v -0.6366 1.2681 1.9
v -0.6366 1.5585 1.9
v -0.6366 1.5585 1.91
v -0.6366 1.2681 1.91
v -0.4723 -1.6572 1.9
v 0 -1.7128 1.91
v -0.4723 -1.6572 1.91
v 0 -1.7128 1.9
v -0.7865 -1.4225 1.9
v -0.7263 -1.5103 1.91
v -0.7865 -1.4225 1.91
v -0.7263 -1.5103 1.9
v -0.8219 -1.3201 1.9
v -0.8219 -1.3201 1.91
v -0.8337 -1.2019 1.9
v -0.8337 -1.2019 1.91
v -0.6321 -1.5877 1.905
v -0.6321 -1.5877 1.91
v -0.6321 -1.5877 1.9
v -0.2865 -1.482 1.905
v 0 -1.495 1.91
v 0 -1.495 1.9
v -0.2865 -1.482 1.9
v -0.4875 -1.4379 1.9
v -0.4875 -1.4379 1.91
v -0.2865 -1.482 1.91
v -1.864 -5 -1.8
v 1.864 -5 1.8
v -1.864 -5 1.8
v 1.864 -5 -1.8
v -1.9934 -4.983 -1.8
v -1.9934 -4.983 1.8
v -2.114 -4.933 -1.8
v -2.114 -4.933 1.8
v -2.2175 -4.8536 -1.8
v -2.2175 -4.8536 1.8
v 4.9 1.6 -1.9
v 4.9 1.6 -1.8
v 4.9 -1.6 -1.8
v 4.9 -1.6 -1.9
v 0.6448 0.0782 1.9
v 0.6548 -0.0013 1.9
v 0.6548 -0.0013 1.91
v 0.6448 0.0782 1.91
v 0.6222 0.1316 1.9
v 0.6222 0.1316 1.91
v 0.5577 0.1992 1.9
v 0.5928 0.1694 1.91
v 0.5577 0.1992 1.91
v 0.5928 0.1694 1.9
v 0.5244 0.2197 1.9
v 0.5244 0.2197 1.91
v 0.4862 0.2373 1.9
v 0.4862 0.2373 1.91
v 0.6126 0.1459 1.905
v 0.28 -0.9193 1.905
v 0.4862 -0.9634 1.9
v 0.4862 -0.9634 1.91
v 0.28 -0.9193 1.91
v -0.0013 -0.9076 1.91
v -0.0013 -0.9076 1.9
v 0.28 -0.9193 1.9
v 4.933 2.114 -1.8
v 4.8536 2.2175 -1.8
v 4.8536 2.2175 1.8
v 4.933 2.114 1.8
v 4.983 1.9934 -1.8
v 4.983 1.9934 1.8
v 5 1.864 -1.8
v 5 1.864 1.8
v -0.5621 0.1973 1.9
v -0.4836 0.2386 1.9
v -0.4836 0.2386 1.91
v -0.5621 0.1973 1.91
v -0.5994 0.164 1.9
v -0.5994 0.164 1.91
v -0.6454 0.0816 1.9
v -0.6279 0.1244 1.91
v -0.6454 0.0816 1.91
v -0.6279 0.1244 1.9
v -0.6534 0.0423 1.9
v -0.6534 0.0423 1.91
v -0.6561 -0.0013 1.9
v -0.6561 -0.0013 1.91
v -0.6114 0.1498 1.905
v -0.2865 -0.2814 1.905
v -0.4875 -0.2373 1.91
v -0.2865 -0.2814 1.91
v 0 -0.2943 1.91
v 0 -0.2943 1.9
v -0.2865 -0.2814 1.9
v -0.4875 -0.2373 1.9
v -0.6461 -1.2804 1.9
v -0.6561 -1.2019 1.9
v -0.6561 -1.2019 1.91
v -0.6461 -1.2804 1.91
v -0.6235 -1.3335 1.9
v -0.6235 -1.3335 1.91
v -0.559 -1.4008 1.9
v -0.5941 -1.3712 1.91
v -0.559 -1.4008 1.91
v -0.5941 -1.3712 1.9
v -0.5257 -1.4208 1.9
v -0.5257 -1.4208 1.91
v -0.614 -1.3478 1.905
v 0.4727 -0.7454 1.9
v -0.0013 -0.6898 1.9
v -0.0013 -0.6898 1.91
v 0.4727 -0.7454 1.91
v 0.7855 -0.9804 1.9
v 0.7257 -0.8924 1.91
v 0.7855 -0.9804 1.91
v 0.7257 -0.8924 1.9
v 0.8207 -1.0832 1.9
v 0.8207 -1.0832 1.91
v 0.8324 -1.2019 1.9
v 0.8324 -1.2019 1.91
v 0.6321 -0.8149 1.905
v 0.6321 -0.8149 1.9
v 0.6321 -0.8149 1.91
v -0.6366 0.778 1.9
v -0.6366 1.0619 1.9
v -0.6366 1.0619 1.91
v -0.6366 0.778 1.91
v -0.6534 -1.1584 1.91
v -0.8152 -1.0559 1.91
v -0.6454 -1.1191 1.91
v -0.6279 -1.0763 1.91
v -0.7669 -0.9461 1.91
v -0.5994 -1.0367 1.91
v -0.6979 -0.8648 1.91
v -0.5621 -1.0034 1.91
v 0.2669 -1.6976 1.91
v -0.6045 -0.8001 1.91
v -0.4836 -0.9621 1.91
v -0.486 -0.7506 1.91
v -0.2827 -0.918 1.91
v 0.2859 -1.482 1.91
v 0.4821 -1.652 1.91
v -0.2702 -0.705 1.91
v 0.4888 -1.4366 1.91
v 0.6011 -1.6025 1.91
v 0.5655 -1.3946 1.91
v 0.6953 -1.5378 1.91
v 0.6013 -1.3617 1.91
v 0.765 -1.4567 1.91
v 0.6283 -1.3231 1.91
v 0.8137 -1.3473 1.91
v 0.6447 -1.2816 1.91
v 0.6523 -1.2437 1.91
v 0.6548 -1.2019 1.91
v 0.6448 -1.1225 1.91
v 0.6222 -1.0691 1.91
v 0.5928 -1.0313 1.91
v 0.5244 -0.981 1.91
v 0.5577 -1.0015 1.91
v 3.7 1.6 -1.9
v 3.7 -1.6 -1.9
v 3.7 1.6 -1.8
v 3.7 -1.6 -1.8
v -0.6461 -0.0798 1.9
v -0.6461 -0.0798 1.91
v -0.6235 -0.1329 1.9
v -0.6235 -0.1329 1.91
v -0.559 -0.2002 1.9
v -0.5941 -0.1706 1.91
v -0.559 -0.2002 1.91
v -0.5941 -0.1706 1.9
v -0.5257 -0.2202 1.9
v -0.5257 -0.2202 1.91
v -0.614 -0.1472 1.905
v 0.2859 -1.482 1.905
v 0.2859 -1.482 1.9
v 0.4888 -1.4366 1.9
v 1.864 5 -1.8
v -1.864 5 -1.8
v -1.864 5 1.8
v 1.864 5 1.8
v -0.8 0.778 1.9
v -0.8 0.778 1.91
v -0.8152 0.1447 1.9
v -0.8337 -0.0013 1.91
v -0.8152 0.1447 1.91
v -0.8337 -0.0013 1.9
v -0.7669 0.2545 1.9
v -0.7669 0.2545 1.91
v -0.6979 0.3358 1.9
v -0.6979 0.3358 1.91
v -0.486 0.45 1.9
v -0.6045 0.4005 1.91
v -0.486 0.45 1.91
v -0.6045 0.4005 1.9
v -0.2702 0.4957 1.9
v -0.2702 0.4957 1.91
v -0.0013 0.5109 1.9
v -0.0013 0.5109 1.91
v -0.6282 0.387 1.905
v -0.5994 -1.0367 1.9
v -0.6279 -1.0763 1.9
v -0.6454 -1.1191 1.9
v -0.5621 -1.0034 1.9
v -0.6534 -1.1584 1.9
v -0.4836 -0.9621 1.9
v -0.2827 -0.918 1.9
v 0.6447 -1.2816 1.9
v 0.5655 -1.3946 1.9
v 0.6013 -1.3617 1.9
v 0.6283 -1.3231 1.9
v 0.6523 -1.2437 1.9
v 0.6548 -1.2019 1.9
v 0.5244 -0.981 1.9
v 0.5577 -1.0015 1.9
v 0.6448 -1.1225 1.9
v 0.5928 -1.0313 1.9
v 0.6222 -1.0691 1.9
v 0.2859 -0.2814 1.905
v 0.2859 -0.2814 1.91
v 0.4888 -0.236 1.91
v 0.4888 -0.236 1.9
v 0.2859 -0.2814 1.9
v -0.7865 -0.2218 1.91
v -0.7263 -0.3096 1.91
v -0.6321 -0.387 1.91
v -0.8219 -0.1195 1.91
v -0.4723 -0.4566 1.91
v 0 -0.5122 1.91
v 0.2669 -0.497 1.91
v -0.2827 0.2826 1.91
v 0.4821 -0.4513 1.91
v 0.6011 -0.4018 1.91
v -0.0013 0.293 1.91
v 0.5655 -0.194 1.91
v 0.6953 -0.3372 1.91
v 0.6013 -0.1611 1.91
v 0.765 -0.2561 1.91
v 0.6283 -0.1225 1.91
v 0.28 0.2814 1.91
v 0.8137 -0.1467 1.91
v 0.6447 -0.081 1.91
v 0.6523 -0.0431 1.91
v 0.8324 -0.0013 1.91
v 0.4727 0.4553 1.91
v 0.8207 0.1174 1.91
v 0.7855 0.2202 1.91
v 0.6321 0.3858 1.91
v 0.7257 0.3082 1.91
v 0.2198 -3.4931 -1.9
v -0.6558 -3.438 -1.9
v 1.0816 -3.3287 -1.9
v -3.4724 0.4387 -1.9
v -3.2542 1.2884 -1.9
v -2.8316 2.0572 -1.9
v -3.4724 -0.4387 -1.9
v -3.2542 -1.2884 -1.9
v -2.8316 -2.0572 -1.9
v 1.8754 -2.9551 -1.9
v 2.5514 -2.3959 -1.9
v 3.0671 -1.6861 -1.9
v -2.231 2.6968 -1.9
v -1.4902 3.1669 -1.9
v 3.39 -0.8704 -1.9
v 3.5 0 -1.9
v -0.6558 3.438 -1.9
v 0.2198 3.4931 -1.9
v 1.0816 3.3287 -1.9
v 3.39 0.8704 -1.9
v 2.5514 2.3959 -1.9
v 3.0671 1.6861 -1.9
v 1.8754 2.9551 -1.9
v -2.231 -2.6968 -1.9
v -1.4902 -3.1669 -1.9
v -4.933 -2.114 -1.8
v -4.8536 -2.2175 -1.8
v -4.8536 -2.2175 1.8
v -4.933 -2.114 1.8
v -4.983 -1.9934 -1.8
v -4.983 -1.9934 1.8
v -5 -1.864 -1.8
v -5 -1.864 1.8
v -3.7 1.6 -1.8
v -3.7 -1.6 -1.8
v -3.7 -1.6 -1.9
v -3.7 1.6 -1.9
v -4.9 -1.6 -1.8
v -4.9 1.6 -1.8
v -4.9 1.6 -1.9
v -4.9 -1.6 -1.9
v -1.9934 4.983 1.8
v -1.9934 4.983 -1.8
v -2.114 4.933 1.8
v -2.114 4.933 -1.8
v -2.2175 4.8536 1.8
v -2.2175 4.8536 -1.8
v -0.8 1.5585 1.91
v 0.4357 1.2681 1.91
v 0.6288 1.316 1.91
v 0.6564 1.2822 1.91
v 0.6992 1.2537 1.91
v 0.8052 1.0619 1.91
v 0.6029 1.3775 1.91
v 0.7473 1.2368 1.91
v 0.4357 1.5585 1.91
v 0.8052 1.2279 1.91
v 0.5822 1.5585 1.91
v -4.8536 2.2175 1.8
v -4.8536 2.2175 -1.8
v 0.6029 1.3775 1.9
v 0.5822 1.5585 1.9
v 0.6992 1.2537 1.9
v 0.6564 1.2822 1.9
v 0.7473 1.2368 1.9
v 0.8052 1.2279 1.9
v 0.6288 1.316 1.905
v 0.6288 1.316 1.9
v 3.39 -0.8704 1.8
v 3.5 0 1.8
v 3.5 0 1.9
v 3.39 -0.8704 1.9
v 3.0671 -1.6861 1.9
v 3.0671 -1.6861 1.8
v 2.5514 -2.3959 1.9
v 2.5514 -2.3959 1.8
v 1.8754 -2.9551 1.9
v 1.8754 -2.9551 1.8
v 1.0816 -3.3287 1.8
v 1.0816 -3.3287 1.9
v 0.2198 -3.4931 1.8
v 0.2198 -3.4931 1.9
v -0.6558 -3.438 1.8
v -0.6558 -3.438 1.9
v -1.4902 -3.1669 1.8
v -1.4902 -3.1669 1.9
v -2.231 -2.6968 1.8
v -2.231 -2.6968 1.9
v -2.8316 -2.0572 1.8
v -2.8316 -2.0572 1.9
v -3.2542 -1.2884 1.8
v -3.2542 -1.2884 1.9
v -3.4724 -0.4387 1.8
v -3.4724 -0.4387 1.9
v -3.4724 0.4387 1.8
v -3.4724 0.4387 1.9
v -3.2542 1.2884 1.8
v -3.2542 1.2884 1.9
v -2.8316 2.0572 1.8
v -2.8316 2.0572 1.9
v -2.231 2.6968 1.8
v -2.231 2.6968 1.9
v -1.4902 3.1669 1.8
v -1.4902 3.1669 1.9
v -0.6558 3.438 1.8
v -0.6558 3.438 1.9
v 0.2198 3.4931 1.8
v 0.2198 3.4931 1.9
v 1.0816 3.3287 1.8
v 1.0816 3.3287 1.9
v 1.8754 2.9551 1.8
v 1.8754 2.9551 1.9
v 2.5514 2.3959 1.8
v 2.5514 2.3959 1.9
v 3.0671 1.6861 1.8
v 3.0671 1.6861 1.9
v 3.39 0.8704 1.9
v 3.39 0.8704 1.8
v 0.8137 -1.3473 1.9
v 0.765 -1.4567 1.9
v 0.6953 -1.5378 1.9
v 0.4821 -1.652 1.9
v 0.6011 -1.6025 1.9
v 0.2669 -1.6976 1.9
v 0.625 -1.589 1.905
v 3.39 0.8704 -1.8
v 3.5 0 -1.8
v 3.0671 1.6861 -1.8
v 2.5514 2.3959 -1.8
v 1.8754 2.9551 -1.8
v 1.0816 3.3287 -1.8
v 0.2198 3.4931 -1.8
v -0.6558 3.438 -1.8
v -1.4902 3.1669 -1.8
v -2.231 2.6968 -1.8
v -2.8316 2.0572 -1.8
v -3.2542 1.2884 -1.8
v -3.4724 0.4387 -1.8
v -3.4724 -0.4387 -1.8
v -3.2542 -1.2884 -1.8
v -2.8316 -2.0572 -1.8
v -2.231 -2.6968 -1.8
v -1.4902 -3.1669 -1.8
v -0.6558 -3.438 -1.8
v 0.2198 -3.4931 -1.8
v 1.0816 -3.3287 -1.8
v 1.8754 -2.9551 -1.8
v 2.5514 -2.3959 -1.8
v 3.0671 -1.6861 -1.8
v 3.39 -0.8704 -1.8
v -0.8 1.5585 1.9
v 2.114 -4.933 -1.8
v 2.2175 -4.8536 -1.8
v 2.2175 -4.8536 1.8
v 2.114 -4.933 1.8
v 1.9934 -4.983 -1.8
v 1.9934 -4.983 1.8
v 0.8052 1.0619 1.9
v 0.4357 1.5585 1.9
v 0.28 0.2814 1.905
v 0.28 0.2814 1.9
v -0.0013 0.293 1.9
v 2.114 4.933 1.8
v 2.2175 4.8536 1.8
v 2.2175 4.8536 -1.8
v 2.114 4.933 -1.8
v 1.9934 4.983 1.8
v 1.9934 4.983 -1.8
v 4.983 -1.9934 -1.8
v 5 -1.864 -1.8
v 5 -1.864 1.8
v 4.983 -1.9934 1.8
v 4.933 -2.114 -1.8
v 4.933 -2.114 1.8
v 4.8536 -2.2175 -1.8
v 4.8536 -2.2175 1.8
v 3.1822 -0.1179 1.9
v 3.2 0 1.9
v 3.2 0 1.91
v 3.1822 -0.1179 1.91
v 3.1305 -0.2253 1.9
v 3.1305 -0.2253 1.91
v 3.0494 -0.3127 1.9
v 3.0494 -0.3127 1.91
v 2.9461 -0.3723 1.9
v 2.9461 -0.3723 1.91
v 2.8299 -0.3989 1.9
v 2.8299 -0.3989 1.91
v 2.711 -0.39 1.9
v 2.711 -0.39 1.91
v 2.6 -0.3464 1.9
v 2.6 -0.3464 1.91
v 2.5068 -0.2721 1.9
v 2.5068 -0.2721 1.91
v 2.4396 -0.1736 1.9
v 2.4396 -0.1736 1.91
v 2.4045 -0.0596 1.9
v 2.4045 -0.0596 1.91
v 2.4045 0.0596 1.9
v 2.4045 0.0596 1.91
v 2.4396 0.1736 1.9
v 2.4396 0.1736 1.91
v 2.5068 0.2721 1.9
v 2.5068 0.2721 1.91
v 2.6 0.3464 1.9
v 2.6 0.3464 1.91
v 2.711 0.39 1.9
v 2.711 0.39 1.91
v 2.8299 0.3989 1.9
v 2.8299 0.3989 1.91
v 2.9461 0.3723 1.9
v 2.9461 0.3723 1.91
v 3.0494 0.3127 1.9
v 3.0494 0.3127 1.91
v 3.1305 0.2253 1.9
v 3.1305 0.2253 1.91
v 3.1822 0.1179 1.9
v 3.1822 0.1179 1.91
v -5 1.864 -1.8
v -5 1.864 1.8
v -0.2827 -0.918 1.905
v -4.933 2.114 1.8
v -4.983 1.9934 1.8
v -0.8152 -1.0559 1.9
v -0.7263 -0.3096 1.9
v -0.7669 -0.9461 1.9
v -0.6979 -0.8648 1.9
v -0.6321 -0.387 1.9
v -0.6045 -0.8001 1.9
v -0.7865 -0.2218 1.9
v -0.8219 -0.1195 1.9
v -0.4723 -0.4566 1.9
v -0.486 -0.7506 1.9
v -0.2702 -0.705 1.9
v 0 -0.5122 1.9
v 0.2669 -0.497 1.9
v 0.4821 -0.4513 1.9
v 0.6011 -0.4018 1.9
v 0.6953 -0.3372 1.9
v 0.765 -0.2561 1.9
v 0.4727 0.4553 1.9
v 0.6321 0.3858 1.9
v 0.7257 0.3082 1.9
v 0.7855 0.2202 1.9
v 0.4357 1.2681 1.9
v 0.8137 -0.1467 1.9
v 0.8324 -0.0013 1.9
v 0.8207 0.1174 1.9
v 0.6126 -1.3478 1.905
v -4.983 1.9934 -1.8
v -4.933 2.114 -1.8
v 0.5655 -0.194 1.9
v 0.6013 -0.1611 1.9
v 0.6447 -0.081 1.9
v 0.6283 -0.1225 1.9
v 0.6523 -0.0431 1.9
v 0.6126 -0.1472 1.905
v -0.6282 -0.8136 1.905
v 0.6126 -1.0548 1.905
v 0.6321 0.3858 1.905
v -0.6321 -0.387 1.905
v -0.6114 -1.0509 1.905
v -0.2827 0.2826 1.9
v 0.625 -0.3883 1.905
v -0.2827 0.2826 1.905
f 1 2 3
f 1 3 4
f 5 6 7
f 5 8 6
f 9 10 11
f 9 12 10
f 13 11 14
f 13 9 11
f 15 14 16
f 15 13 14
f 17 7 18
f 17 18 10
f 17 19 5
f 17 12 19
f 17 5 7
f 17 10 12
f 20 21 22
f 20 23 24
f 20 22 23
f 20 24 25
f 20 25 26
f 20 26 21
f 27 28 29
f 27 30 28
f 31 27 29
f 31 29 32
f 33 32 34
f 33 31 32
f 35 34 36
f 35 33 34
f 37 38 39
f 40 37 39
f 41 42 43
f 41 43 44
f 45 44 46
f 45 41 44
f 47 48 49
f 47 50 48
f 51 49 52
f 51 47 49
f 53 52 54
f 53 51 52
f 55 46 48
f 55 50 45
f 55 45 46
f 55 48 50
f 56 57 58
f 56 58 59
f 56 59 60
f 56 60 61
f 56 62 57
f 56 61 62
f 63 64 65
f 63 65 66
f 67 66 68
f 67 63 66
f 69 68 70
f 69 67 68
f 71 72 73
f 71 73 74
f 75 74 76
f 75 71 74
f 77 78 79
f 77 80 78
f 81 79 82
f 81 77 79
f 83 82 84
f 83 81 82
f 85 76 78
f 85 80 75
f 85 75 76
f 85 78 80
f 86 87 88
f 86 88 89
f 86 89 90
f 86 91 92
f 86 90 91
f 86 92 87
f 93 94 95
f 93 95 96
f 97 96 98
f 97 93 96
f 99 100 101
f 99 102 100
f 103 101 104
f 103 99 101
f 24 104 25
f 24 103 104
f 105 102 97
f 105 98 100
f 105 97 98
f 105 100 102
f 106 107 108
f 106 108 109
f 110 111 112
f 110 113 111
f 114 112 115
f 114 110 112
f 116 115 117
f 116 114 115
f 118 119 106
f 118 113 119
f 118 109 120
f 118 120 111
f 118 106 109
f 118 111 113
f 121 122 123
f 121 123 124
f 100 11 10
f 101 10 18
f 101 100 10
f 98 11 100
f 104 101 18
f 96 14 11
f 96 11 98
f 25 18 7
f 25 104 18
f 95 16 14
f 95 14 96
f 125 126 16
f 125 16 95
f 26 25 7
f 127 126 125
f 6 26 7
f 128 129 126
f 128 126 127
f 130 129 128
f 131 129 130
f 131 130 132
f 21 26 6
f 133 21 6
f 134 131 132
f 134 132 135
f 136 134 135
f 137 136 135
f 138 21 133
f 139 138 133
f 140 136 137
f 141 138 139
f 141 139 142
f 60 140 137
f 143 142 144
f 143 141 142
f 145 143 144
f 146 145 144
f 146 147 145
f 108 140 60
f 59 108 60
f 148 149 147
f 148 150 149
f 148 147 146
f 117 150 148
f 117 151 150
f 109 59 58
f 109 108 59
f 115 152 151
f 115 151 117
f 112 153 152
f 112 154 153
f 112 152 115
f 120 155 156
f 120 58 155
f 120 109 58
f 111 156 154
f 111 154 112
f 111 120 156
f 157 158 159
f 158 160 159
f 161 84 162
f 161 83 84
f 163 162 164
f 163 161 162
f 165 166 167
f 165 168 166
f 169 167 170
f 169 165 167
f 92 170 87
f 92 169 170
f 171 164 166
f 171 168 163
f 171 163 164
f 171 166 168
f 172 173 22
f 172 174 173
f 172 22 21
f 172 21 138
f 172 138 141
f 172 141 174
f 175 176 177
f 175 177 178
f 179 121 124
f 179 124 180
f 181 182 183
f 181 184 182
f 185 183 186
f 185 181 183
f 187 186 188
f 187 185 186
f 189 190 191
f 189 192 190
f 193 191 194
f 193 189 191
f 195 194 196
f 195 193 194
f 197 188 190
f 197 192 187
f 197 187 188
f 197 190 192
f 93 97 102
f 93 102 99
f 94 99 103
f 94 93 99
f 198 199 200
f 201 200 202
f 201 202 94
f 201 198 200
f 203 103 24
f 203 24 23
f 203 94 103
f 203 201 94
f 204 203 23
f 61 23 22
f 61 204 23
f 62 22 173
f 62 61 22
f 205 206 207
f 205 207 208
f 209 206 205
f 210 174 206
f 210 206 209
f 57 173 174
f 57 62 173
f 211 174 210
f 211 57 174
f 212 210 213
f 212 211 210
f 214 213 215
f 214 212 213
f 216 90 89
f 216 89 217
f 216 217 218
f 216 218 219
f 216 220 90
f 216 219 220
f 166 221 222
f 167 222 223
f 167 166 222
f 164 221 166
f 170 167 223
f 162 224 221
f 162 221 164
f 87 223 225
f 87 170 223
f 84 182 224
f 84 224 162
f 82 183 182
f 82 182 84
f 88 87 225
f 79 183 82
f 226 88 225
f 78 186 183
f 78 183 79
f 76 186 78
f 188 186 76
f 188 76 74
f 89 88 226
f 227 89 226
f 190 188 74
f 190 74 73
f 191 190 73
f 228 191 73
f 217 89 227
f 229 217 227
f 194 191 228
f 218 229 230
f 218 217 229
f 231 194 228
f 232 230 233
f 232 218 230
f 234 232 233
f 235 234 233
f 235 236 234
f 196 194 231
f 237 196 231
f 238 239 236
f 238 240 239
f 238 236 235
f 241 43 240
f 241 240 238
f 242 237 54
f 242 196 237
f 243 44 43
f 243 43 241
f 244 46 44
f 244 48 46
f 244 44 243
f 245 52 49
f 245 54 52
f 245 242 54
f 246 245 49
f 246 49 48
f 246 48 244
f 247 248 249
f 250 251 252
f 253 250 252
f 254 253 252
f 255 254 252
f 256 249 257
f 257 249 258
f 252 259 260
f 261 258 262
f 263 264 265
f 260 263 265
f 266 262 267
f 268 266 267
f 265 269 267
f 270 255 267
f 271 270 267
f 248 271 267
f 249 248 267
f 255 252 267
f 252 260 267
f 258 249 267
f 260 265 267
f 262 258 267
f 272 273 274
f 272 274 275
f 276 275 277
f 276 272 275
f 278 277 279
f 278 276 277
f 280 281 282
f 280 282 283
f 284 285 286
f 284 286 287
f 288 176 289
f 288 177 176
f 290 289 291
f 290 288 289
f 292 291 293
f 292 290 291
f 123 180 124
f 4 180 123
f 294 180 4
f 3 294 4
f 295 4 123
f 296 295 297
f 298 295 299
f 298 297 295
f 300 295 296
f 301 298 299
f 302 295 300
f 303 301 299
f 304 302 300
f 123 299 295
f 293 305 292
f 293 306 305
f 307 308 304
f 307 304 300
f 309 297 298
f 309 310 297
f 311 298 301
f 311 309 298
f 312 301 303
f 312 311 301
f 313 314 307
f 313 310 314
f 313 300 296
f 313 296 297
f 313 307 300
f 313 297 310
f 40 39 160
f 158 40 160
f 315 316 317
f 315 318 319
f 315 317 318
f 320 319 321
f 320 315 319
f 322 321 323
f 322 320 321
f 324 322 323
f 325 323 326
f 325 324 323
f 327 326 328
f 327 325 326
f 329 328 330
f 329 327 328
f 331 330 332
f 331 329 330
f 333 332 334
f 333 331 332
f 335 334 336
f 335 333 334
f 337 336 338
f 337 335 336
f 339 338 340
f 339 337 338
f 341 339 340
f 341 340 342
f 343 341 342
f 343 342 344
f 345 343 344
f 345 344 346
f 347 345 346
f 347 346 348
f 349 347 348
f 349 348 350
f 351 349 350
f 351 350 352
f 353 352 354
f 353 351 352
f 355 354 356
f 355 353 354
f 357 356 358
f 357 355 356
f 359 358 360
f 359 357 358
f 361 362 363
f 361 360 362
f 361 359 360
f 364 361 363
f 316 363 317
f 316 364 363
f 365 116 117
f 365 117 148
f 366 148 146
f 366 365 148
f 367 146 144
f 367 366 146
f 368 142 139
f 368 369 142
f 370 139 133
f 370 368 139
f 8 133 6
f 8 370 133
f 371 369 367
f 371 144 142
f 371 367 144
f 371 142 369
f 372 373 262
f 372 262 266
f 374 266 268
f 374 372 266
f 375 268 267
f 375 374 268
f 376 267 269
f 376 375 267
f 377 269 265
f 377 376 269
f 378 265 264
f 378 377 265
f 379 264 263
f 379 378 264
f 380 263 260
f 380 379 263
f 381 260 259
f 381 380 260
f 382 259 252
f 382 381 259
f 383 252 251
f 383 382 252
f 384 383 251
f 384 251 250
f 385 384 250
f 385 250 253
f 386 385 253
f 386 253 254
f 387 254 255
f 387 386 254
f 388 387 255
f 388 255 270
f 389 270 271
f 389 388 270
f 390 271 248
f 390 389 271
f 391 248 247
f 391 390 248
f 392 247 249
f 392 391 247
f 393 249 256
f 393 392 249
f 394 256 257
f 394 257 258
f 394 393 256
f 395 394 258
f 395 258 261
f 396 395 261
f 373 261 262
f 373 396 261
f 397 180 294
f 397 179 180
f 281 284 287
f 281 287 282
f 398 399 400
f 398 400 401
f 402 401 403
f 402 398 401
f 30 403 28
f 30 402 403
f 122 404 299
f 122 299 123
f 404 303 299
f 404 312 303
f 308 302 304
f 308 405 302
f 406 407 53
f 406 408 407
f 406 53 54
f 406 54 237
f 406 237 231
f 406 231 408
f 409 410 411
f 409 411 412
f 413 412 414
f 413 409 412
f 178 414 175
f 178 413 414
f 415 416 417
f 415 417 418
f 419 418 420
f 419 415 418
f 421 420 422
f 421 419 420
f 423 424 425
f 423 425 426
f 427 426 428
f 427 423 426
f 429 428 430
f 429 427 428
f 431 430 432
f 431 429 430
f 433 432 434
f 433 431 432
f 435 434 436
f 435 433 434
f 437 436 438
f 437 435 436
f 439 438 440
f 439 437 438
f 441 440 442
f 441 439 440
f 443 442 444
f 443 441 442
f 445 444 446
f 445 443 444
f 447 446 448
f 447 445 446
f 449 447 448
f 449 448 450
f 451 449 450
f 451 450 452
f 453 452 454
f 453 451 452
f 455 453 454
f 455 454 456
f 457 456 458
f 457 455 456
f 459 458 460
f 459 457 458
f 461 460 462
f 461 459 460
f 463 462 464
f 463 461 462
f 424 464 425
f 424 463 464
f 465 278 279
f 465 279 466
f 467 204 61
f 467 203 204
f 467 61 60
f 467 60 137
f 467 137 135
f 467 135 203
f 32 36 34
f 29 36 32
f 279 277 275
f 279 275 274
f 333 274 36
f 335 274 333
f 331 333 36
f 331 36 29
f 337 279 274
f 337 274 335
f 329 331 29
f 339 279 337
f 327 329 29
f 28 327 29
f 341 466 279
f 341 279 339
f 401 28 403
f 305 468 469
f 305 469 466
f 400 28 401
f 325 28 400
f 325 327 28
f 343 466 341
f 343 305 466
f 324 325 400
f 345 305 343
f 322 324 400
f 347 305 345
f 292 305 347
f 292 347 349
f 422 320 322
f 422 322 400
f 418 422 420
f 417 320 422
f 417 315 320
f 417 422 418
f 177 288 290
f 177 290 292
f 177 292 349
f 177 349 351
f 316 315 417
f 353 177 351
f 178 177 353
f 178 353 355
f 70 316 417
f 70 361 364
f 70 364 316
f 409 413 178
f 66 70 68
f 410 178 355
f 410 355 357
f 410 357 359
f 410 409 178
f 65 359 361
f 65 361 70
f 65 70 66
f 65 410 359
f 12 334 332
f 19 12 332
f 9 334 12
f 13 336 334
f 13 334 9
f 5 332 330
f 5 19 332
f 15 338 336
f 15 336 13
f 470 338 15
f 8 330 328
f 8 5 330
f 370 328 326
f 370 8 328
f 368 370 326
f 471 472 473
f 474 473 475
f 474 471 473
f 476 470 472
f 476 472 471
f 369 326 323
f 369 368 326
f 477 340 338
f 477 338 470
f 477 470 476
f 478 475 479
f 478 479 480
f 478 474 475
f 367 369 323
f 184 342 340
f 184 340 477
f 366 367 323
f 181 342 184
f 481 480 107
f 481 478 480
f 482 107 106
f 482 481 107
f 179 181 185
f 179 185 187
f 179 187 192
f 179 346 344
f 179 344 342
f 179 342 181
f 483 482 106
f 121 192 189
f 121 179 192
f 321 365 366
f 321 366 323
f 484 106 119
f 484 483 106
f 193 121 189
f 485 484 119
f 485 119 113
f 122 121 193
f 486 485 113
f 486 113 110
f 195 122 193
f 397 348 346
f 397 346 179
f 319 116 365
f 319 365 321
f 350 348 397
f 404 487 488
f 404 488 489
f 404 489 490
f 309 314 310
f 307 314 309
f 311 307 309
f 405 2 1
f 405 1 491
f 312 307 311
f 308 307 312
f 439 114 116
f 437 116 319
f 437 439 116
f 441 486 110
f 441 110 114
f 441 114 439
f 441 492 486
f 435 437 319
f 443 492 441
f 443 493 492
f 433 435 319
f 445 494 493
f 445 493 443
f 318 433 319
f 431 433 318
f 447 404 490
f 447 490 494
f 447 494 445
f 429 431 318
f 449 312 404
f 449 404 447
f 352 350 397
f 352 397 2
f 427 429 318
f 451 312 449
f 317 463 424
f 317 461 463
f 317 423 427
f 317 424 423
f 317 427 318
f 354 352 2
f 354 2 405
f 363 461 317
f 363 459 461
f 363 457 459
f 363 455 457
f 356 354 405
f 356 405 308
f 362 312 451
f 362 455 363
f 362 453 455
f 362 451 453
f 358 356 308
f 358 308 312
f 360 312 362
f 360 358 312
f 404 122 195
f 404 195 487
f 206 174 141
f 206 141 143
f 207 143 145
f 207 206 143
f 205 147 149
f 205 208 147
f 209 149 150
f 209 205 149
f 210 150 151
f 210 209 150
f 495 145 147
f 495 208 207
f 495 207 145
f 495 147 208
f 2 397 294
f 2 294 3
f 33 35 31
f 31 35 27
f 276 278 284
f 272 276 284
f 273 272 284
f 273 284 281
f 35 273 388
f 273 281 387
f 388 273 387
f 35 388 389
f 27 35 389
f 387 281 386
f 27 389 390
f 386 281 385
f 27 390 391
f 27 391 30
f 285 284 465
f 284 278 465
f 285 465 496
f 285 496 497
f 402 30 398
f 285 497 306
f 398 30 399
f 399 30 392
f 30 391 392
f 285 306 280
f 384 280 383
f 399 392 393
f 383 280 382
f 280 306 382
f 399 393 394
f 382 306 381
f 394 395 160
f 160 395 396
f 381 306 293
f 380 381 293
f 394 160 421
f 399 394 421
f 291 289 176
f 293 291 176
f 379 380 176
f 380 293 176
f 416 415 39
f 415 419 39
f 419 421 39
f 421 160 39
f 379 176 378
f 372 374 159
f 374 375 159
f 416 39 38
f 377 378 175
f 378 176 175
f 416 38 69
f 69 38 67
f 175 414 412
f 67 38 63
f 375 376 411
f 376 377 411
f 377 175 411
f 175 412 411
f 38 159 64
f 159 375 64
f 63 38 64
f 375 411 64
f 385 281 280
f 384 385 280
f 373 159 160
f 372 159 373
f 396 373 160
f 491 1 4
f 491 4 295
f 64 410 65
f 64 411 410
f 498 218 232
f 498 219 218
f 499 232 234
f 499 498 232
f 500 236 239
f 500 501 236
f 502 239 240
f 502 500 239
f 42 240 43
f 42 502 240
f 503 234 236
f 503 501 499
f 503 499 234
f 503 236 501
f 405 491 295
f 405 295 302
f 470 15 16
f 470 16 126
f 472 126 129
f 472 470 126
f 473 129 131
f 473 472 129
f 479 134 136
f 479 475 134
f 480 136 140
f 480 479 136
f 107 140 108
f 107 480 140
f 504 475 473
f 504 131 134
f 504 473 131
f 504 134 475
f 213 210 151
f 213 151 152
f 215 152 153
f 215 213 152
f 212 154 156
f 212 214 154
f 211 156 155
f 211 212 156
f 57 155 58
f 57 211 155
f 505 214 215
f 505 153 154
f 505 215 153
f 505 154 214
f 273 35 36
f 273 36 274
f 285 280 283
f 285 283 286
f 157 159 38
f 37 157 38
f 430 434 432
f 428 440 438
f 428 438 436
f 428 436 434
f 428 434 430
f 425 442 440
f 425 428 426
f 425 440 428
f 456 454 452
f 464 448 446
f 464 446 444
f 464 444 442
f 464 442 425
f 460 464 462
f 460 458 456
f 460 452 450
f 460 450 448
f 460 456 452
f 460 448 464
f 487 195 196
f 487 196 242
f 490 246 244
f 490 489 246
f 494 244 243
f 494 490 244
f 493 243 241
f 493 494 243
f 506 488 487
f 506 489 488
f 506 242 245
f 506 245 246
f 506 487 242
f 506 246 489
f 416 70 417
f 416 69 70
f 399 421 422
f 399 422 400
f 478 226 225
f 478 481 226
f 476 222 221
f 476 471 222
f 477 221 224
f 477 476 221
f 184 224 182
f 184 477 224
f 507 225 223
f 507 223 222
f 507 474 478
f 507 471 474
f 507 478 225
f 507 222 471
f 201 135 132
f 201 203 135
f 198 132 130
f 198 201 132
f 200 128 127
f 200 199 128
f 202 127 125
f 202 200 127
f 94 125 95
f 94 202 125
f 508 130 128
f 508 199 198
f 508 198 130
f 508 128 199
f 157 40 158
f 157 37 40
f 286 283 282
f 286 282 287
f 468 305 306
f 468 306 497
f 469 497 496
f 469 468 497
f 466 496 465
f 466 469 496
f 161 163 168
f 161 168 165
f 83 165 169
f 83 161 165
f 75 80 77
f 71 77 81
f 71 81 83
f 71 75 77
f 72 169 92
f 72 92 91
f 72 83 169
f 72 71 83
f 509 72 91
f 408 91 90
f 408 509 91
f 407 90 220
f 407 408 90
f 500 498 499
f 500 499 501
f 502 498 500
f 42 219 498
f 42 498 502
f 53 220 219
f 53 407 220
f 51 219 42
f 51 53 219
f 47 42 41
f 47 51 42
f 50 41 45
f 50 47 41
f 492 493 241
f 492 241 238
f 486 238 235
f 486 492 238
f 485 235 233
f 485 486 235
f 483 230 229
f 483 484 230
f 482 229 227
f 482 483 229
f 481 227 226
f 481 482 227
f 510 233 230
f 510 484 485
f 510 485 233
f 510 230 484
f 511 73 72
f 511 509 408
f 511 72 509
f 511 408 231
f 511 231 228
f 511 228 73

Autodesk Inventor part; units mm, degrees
ref_plane "YZ Plane" through (0, 0, 0) normal (1, 0, 0) x (0, 1, 0)
ref_plane "XZ Plane" through (0, 0, 0) normal (0, 1, 0) x (-1, 0, 0)
ref_plane "XY Plane" through (0, 0, 0) normal (0, 0, 1) x (1, 0, 0)
sketch "Sketch1" plane through (0, 0, 0) normal (0, 0, 1) x (1, 0, 0)
  circle A0 centre (0, 0) radius 3.5
  dimension "d0" = 7
extrude "Extrusion1" add sketch "Sketch1" along normal mid plane 3.8
sketch "Sketch2" plane through (0, 0, 0) normal (0, 0, 1) x (1, 0, 0)
  line L0 (2.0711, 5) -> (5, 2.0711)
  line L1 (5, 2.0711) -> (5, -2.0711)
  line L2 (5, -2.0711) -> (2.0711, -5)
  line L3 (2.0711, -5) -> (-2.0711, -5)
  line L4 (-2.0711, -5) -> (-5, -2.0711)
  line L5 (-5, -2.0711) -> (-5, 2.0711)
  line L6 (-5, 2.0711) -> (-2.0711, 5)
  line L7 (-2.0711, 5) -> (2.0711, 5)
  point P0 (0, 0)
  point P1 (0, 0)
  dimension "d3" = 10
extrude "Extrusion2" add sketch "Sketch2" along normal mid plane 3.6
sketch "Sketch3" plane through (0, 0, -1.8) normal (0, 0, -1) x (-1, 0, 0)
  line L0 (-2.0711, 5) -> (-5, 2.0711) projected
  line L1 (-5, 2.0711) -> (-5, -2.0711) projected
  line L2 (-5, -2.0711) -> (-2.0711, -5) projected
  line L3 (-2.0711, -5) -> (2.0711, -5) projected
  line L4 (2.0711, -5) -> (5, -2.0711) projected
  line L5 (5, -2.0711) -> (5, 2.0711) projected
  line L6 (5, 2.0711) -> (2.0711, 5) projected
  line L7 (2.0711, 5) -> (-2.0711, 5) projected
  circle A0 centre (0, 0) radius 3.5 projected
  line L8 (-4.9, -1.6) -> (-3.7, -1.6)
  line L9 (-3.7, -1.6) -> (-3.7, 1.6)
  line L10 (-3.7, 1.6) -> (-4.9, 1.6)
  line L11 (-4.9, 1.6) -> (-4.9, -1.6)
  line L12 (4.9, -1.6) -> (3.7, -1.6)
  line L13 (3.7, -1.6) -> (3.7, 1.6)
  line L14 (3.7, 1.6) -> (4.9, 1.6)
  line L15 (4.9, 1.6) -> (4.9, -1.6)
  point P0 (-4.9, 0)
  point P1 (-5, 0)
  dimension "d6" = 3.2
  dimension "d7" = 0.1
  dimension "d8" = 0.1
  dimension "d9" = 7.4
extrude "Extrusion3" add sketch "Sketch3" along normal blind 0.1 contours L11 L10 L9 L8 | L12 L13 L14 L15
sketch "Sketch4" plane through (0, 0, 1.9) normal (0, 0, 1) x (1, 0, 0)
  circle A0 centre (0, 0) radius 3.5 projected
  circle A1 centre (2.8, 0) radius 0.4
  circle A2 centre (0, 0) radius 3.5 construction
  line L0 (0, 3.5) -> (0, -3.5) construction
  line L1 (-0.8, 0.778) -> (-0.8, 1.5585)
  line L2 (-0.8, 1.5585) -> (-0.6366, 1.5585)
  line L3 (-0.6366, 1.5585) -> (-0.6366, 1.2681)
  line L4 (-0.6366, 1.2681) -> (0.4357, 1.2681)
  line L5 (0.4357, 1.2681) -> (0.4357, 1.5585)
  line L6 (0.4357, 1.5585) -> (0.5822, 1.5585)
  spline S0 degree 2 poles (0.5822, 1.5585) (0.5822, 1.3938) (0.6755, 1.2382) (0.8052, 1.2279) knots 0 0 0 1 2 2 2
  line L7 (0.8052, 1.2279) -> (0.8052, 1.0619)
  line L8 (0.8052, 1.0619) -> (-0.6366, 1.0619)
  line L9 (-0.6366, 1.0619) -> (-0.6366, 0.778)
  line L10 (-0.6366, 0.778) -> (-0.8, 0.778)
  spline S1 degree 2 poles (0, -0.5122) (-0.4305, -0.5122) (-0.8337, -0.2619) (-0.8337, -0.0013) knots 0 0 0 1 2 2 2
  spline S2 degree 2 poles (-0.8337, -0.0013) (-0.8337, 0.2632) (-0.4227, 0.5109) (-0.0013, 0.5109) knots 0 0 0 1 2 2 2
  spline S3 degree 2 poles (-0.0013, 0.5109) (0.4318, 0.5109) (0.8324, 0.2606) (0.8324, -0.0013) knots 0 0 0 1 2 2 2
  spline S4 degree 2 poles (0.8324, -0.0013) (0.8324, -0.2645) (0.4175, -0.5122) (0, -0.5122) knots 0 0 0 1 2 2 2
  spline S5 degree 2 poles (-0.4875, -0.2373) (-0.4084, -0.2684) (-0.1647, -0.2943) (0, -0.2943) knots 0 0 0 1 2 2 2
  spline S6 degree 2 poles (0, -0.2943) (0.1647, -0.2943) (0.4071, -0.2684) (0.4888, -0.236) knots 0 0 0 1 2 2 2
  spline S7 degree 2 poles (0.4888, -0.236) (0.5705, -0.2036) (0.6548, -0.0908) (0.6548, -0.0013) knots 0 0 0 1 2 2 2
  spline S8 degree 2 poles (0.6548, -0.0013) (0.6548, 0.0882) (0.5705, 0.2036) (0.4862, 0.2373) knots 0 0 0 1 2 2 2
  spline S9 degree 2 poles (0.4862, 0.2373) (0.4045, 0.2697) (0.1556, 0.293) (-0.0013, 0.293) knots 0 0 0 1 2 2 2
  spline S10 degree 2 poles (-0.0013, 0.293) (-0.1699, 0.293) (-0.3955, 0.2723) (-0.4836, 0.2386) knots 0 0 0 1 2 2 2
  spline S11 degree 2 poles (-0.4836, 0.2386) (-0.5666, 0.2075) (-0.6561, 0.0921) (-0.6561, -0.0013) knots 0 0 0 1 2 2 2
  spline S12 degree 2 poles (-0.6561, -0.0013) (-0.6561, -0.0895) (-0.5718, -0.2049) (-0.4875, -0.2373) knots 0 0 0 1 2 2 2
  spline S13 degree 2 poles (0, -1.7128) (-0.4305, -1.7128) (-0.8337, -1.4626) (-0.8337, -1.2019) knots 0 0 0 1 2 2 2
  spline S14 degree 2 poles (-0.8337, -1.2019) (-0.8337, -0.9374) (-0.4227, -0.6898) (-0.0013, -0.6898) knots 0 0 0 1 2 2 2
  spline S15 degree 2 poles (-0.0013, -0.6898) (0.4318, -0.6898) (0.8324, -0.94) (0.8324, -1.2019) knots 0 0 0 1 2 2 2
  spline S16 degree 2 poles (0.8324, -1.2019) (0.8324, -1.4652) (0.4175, -1.7128) (0, -1.7128) knots 0 0 0 1 2 2 2
  spline S17 degree 2 poles (-0.4875, -1.4379) (-0.4084, -1.469) (-0.1647, -1.495) (0, -1.495) knots 0 0 0 1 2 2 2
  spline S18 degree 2 poles (0, -1.495) (0.1647, -1.495) (0.4071, -1.469) (0.4888, -1.4366) knots 0 0 0 1 2 2 2
  spline S19 degree 2 poles (0.4888, -1.4366) (0.5705, -1.4042) (0.6548, -1.2914) (0.6548, -1.2019) knots 0 0 0 1 2 2 2
  spline S20 degree 2 poles (0.6548, -1.2019) (0.6548, -1.1125) (0.5705, -0.9971) (0.4862, -0.9634) knots 0 0 0 1 2 2 2
  spline S21 degree 2 poles (0.4862, -0.9634) (0.4045, -0.931) (0.1556, -0.9076) (-0.0013, -0.9076) knots 0 0 0 1 2 2 2
  spline S22 degree 2 poles (-0.0013, -0.9076) (-0.1699, -0.9076) (-0.3955, -0.9284) (-0.4836, -0.9621) knots 0 0 0 1 2 2 2
  spline S23 degree 2 poles (-0.4836, -0.9621) (-0.5666, -0.9932) (-0.6561, -1.1086) (-0.6561, -1.2019) knots 0 0 0 1 2 2 2
  spline S24 degree 2 poles (-0.6561, -1.2019) (-0.6561, -1.2901) (-0.5718, -1.4055) (-0.4875, -1.4379) knots 0 0 0 1 2 2 2
  dimension "d12" = 0.8
  dimension "d13" = 2.8
extrude "Extrusion4" add sketch "Sketch4" along normal blind 0.01 contours A1 | L1 L2 L3 L4 L5 L6 S0 L7 L8 L9 L10 | S1 S2 S3 S4 | S13 S14 S15 S16
fillet "Fillet1" radius 0.5 8 edges at (-2.0711, -5, 0) (2.0711, -5, 0) (5, -2.0711, 0) (5, 2.0711, 0) (2.0711, 5, 0) (-2.0711, 5, 0) (-5, 2.0711, 0) (-5, -2.0711, 0)
equation "\"d8\" = d7"
properties part number "34-103B" material "Iron, Cast"
